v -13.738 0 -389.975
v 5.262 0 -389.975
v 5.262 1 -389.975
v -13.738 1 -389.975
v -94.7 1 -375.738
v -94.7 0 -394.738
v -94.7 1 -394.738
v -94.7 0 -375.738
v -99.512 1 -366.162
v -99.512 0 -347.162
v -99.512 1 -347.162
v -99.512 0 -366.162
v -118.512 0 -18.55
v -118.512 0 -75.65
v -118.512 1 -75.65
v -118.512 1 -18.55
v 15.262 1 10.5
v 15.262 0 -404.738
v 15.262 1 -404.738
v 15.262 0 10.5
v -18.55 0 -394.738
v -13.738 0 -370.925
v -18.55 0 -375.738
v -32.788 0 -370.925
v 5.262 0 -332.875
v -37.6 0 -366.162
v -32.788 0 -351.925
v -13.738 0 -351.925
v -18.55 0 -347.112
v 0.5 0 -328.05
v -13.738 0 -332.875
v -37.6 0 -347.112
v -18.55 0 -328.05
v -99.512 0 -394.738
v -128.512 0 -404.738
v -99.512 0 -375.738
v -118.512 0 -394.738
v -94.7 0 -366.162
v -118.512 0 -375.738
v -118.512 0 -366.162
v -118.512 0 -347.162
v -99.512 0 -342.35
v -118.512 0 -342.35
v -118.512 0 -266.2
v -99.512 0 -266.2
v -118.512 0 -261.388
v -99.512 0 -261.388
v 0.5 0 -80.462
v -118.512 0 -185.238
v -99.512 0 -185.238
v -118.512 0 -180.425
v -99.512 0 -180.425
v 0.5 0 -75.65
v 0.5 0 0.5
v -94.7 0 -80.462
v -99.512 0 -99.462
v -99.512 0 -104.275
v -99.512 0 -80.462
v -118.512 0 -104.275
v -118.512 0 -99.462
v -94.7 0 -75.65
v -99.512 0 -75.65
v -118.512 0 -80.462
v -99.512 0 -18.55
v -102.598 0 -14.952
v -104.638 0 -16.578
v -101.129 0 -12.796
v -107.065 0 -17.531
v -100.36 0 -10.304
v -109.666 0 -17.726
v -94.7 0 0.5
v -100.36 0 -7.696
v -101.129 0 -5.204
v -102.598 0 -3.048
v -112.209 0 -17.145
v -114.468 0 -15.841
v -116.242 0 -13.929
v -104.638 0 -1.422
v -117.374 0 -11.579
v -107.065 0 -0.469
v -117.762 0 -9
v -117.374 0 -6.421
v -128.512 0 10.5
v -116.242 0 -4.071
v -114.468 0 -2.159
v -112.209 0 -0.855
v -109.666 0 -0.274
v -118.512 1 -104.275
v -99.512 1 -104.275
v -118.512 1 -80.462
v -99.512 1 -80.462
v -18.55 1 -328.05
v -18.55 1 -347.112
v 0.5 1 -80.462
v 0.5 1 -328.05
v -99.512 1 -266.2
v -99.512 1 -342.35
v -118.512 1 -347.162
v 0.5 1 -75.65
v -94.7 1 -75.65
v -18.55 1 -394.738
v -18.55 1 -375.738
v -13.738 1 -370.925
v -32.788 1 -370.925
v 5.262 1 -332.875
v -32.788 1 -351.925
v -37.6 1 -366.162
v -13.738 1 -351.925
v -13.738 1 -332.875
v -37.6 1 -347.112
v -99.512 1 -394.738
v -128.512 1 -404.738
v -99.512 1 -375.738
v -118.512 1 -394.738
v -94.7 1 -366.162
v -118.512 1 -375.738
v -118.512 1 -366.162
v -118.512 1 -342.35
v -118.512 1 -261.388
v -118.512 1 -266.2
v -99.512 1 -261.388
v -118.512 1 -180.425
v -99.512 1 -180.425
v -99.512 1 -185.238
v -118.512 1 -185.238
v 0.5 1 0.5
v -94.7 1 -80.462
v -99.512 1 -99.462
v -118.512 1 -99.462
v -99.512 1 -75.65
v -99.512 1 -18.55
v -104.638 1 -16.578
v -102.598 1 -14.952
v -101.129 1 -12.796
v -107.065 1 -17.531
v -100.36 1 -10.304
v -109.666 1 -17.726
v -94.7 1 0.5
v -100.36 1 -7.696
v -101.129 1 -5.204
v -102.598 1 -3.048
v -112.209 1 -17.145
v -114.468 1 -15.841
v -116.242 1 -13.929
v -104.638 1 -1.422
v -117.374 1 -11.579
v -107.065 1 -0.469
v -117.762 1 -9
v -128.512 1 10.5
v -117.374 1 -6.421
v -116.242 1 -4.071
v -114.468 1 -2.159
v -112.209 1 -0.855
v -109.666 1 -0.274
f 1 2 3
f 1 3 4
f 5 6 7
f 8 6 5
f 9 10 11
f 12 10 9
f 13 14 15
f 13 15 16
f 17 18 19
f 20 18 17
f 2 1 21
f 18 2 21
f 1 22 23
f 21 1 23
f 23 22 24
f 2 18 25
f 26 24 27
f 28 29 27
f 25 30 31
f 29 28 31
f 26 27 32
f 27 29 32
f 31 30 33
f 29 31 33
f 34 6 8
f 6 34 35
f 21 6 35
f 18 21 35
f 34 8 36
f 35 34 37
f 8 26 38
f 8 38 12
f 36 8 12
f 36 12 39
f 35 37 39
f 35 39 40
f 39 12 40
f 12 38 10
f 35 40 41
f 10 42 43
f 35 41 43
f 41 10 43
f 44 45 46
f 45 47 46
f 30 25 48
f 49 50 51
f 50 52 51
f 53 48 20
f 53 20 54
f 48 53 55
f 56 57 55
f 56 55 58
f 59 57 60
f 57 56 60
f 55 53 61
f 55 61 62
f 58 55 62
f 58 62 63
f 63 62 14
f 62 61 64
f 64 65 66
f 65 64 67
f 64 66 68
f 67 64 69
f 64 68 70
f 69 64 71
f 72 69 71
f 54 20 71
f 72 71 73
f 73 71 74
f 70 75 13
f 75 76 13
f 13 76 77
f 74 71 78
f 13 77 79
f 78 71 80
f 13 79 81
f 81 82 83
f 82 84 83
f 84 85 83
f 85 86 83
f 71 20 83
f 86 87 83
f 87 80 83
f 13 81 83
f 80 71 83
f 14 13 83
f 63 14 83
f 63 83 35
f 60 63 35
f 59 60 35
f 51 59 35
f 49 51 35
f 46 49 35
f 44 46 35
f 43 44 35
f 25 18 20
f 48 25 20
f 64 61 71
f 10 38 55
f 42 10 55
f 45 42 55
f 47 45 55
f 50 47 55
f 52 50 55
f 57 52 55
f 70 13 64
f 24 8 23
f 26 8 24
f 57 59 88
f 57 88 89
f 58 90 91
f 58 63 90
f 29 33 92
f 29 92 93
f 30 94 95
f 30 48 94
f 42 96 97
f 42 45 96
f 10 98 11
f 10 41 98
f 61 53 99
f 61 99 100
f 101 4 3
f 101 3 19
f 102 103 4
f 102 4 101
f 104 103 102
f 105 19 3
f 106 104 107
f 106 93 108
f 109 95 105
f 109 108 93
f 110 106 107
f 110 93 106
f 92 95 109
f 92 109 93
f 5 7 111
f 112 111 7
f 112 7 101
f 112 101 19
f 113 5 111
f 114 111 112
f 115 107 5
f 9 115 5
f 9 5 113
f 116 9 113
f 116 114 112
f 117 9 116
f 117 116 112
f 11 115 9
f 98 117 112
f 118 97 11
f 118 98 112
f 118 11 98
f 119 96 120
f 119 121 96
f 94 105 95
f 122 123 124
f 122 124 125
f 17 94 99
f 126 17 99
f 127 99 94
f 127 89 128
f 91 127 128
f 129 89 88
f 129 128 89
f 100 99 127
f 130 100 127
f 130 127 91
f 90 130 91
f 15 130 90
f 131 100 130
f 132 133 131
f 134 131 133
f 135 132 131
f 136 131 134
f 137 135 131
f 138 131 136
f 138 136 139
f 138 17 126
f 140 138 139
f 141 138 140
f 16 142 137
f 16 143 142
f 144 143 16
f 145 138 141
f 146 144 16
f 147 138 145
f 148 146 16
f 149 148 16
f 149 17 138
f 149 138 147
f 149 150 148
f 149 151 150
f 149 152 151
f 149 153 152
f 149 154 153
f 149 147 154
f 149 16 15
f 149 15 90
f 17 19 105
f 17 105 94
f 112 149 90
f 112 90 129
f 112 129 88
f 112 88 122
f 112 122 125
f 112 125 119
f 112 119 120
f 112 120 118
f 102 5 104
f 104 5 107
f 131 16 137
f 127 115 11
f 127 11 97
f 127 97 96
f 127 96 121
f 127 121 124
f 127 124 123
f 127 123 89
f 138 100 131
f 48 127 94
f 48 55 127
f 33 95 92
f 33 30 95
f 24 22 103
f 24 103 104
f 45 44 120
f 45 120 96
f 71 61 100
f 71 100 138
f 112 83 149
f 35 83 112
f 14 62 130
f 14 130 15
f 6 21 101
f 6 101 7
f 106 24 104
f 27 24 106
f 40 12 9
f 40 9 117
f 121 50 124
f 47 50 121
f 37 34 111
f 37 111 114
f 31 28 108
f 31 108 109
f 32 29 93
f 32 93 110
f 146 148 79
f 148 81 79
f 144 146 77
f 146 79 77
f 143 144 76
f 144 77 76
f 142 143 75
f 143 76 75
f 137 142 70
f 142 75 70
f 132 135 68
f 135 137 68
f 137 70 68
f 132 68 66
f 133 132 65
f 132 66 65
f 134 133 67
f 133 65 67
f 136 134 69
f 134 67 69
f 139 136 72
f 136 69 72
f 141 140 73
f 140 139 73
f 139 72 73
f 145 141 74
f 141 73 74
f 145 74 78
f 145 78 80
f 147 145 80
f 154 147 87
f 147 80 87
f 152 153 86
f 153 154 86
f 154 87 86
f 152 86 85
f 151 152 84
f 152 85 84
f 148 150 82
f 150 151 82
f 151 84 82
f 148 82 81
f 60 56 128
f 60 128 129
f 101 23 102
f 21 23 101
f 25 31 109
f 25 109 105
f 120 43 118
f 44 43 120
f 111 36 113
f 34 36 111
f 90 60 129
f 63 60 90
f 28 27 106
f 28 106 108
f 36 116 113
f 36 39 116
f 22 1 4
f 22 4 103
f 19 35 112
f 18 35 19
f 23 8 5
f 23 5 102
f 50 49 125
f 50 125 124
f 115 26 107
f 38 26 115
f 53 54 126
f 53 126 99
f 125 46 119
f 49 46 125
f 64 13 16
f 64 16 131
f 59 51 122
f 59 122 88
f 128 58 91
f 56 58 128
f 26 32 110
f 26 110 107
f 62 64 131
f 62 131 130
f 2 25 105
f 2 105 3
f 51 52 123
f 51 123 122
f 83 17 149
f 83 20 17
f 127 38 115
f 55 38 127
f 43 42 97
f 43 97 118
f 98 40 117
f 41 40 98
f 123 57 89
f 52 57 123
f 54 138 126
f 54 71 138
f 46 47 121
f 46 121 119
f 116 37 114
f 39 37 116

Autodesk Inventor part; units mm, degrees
ref_plane "YZ Plane" through (0, 0, 0) normal (1, 0, 0) x (0, 1, 0)
ref_plane "XZ Plane" through (0, 0, 0) normal (0, 1, 0) x (-1, 0, 0)
ref_plane "XY Plane" through (0, 0, 0) normal (0, 0, 1) x (1, 0, 0)
sketch "Sketch1" plane through (0, 0, 0) normal (0, 1, 0) x (-1, 0, 0)
  line L0 (0, 0) -> (18, 0)
  line L1 (18, 0) -> (18, -37.05)
  line L2 (18, -37.05) -> (0, -37.05)
  line L3 (0, -37.05) -> (0, 0)
  line L4 (18, -38.1) -> (0, -38.1)
  line L5 (0, -38.1) -> (0, -56.1)
  line L6 (0, -56.1) -> (18, -56.1)
  line L7 (18, -56.1) -> (18, -38.1)
  line L8 (0, -57.15) -> (37.05, -57.15)
  line L9 (37.05, -57.15) -> (37.05, -75.15)
  line L10 (37.05, -75.15) -> (0, -75.15)
  line L11 (0, -75.15) -> (0, -57.15)
  line L12 (19.05, -56.1) -> (37.05, -56.1)
  line L13 (37.05, -56.1) -> (37.05, -38.1)
  line L14 (37.05, -38.1) -> (19.05, -38.1)
  line L15 (19.05, -38.1) -> (19.05, -56.1)
  line L16 (19.05, -37.05) -> (37.05, -37.05)
  line L17 (37.05, -37.05) -> (37.05, -19.05)
  line L18 (37.05, -19.05) -> (19.05, -19.05)
  line L19 (19.05, -19.05) -> (19.05, -37.05)
  line L20 (19.05, -18) -> (37.05, -18)
  line L21 (37.05, -18) -> (37.05, 0)
  line L22 (37.05, 0) -> (19.05, 0)
  line L23 (19.05, 0) -> (19.05, -18)
  line L24 (38.1, 0) -> (56.1, 0)
  line L25 (56.1, 0) -> (56.1, -18)
  line L26 (56.1, -18) -> (38.1, -18)
  line L27 (38.1, -18) -> (38.1, 0)
  line L28 (38.1, -19.05) -> (56.1, -19.05)
  line L29 (56.1, -19.05) -> (56.1, -37.05)
  line L30 (56.1, -37.05) -> (38.1, -37.05)
  line L31 (38.1, -37.05) -> (38.1, -19.05)
  line L32 (38.1, -38.1) -> (56.1, -38.1)
  line L33 (56.1, -38.1) -> (56.1, -56.1)
  line L34 (56.1, -56.1) -> (38.1, -56.1)
  line L35 (38.1, -56.1) -> (38.1, -38.1)
  line L36 (38.1, -57.15) -> (75.15, -57.15)
  line L37 (75.15, -57.15) -> (75.15, -75.15)
  line L38 (75.15, -75.15) -> (38.1, -75.15)
  line L39 (38.1, -75.15) -> (38.1, -57.15)
  line L40 (57.15, -56.1) -> (75.15, -56.1)
  line L41 (75.15, -56.1) -> (75.15, -38.1)
  line L42 (75.15, -38.1) -> (57.15, -38.1)
  line L43 (57.15, -38.1) -> (57.15, -56.1)
  line L44 (57.15, -37.05) -> (75.15, -37.05)
  line L45 (75.15, -37.05) -> (75.15, -19.05)
  line L46 (75.15, -19.05) -> (57.15, -19.05)
  line L47 (57.15, -19.05) -> (57.15, -37.05)
  line L48 (57.15, -18) -> (75.15, -18)
  line L49 (75.15, -18) -> (75.15, 0)
  line L50 (75.15, 0) -> (57.15, 0)
  line L51 (57.15, 0) -> (57.15, -18)
  line L52 (76.2, 0) -> (94.2, 0)
  line L53 (94.2, 0) -> (94.2, -18)
  line L54 (94.2, -18) -> (76.2, -18)
  line L55 (76.2, -18) -> (76.2, 0)
  line L56 (76.2, -19.05) -> (94.2, -19.05)
  line L57 (94.2, -19.05) -> (94.2, -37.05)
  line L58 (94.2, -37.05) -> (76.2, -37.05)
  line L59 (76.2, -37.05) -> (76.2, -19.05)
  line L60 (76.2, -38.1) -> (94.2, -38.1)
  line L61 (94.2, -38.1) -> (94.2, -56.1)
  line L62 (94.2, -56.1) -> (76.2, -56.1)
  line L63 (76.2, -56.1) -> (76.2, -38.1)
  line L64 (76.2, -57.15) -> (94.2, -57.15)
  line L65 (94.2, -57.15) -> (94.2, -75.15)
  line L66 (94.2, -75.15) -> (76.2, -75.15)
  line L67 (76.2, -75.15) -> (76.2, -57.15)
  line L68 (100.0125, -19.05) -> (118.0125, -19.05)
  line L69 (118.0125, -19.05) -> (118.0125, -37.05)
  line L70 (118.0125, -37.05) -> (100.0125, -37.05)
  line L71 (100.0125, -37.05) -> (100.0125, -19.05)
  line L72 (100.0125, -38.1) -> (118.0125, -38.1)
  line L73 (118.0125, -38.1) -> (118.0125, -56.1)
  line L74 (118.0125, -56.1) -> (100.0125, -56.1)
  line L75 (100.0125, -56.1) -> (100.0125, -38.1)
  line L76 (100.0125, -57.15) -> (118.0125, -57.15)
  line L77 (118.0125, -57.15) -> (118.0125, -75.15)
  line L78 (118.0125, -75.15) -> (100.0125, -75.15)
  line L79 (100.0125, -75.15) -> (100.0125, -57.15)
  line L80 (0, -80.9625) -> (18, -80.9625)
  line L81 (18, -80.9625) -> (18, -103.725)
  line L82 (18, -103.725) -> (0, -103.725)
  line L83 (0, -103.725) -> (0, -80.9625)
  line L84 (0, -104.775) -> (18, -104.775)
  line L85 (18, -104.775) -> (18, -127.5375)
  line L86 (18, -127.5375) -> (0, -127.5375)
  line L87 (0, -127.5375) -> (0, -104.775)
  line L88 (0, -128.5875) -> (18, -128.5875)
  line L89 (18, -128.5875) -> (18, -151.35)
  line L90 (18, -151.35) -> (0, -151.35)
  line L91 (0, -151.35) -> (0, -128.5875)
  line L92 (0, -152.4) -> (18, -152.4)
  line L93 (18, -152.4) -> (18, -270.4)
  line L94 (18, -270.4) -> (0, -270.4)
  line L95 (0, -270.4) -> (0, -152.4)
  line L96 (0, -271.45) -> (18, -271.45)
  line L97 (18, -271.45) -> (18, -289.45)
  line L98 (18, -289.45) -> (0, -289.45)
  line L99 (0, -289.45) -> (0, -271.45)
  line L100 (0, -290.5) -> (18, -290.5)
  line L101 (18, -290.5) -> (18, -308.5)
  line L102 (18, -308.5) -> (0, -308.5)
  line L103 (0, -308.5) -> (0, -290.5)
  line L104 (0, -309.55) -> (18, -309.55)
  line L105 (18, -309.55) -> (18, -327.55)
  line L106 (18, -327.55) -> (0, -327.55)
  line L107 (0, -327.55) -> (0, -309.55)
  line L108 (19.05, -80.9625) -> (37.05, -80.9625)
  line L109 (37.05, -80.9625) -> (37.05, -122.775)
  line L110 (37.05, -122.775) -> (19.05, -122.775)
  line L111 (19.05, -122.775) -> (19.05, -80.9625)
  line L112 (38.1, -80.9625) -> (56.1, -80.9625)
  line L113 (56.1, -80.9625) -> (56.1, -113.25)
  line L114 (56.1, -113.25) -> (38.1, -113.25)
  line L115 (38.1, -113.25) -> (38.1, -80.9625)
  line L116 (57.15, -80.9625) -> (75.15, -80.9625)
  line L117 (75.15, -80.9625) -> (75.15, -108.4875)
  line L118 (75.15, -108.4875) -> (57.15, -108.4875)
  line L119 (57.15, -108.4875) -> (57.15, -80.9625)
  line L120 (76.2, -80.9625) -> (94.2, -80.9625)
  line L121 (94.2, -80.9625) -> (94.2, -98.9625)
  line L122 (94.2, -98.9625) -> (76.2, -98.9625)
  line L123 (76.2, -98.9625) -> (76.2, -80.9625)
  line L124 (19.05, -123.825) -> (37.05, -123.825)
  line L125 (37.05, -123.825) -> (37.05, -141.825)
  line L126 (37.05, -141.825) -> (19.05, -141.825)
  line L127 (19.05, -141.825) -> (19.05, -123.825)
  line L128 (19.05, -142.875) -> (37.05, -142.875)
  line L129 (37.05, -142.875) -> (37.05, -160.875)
  line L130 (37.05, -160.875) -> (19.05, -160.875)
  line L131 (19.05, -160.875) -> (19.05, -142.875)
  line L132 (19.05, -161.925) -> (37.05, -161.925)
  line L133 (37.05, -161.925) -> (37.05, -179.925)
  line L134 (37.05, -179.925) -> (19.05, -179.925)
  line L135 (19.05, -179.925) -> (19.05, -161.925)
  line L136 (19.05, -180.975) -> (37.05, -180.975)
  line L137 (37.05, -180.975) -> (37.05, -198.975)
  line L138 (37.05, -198.975) -> (19.05, -198.975)
  line L139 (19.05, -198.975) -> (19.05, -180.975)
  line L140 (19.05, -200.025) -> (37.05, -200.025)
  line L141 (37.05, -200.025) -> (37.05, -218.025)
  line L142 (37.05, -218.025) -> (19.05, -218.025)
  line L143 (19.05, -218.025) -> (19.05, -200.025)
  line L144 (19.05, -219.075) -> (37.05, -219.075)
  line L145 (37.05, -219.075) -> (37.05, -237.075)
  line L146 (37.05, -237.075) -> (19.05, -237.075)
  line L147 (19.05, -237.075) -> (19.05, -219.075)
  line L148 (19.05, -238.125) -> (37.05, -238.125)
  line L149 (37.05, -238.125) -> (37.05, -256.125)
  line L150 (37.05, -256.125) -> (19.05, -256.125)
  line L151 (19.05, -256.125) -> (19.05, -238.125)
  line L152 (19.05, -257.175) -> (37.05, -257.175)
  line L153 (37.05, -257.175) -> (37.05, -275.175)
  line L154 (37.05, -275.175) -> (19.05, -275.175)
  line L155 (19.05, -275.175) -> (19.05, -257.175)
  line L156 (19.05, -276.225) -> (37.05, -276.225)
  line L157 (37.05, -276.225) -> (37.05, -294.225)
  line L158 (37.05, -294.225) -> (19.05, -294.225)
  line L159 (19.05, -294.225) -> (19.05, -276.225)
  line L160 (19.05, -313.275) -> (37.05, -313.275)
  line L161 (37.05, -313.275) -> (37.05, -295.275)
  line L162 (37.05, -295.275) -> (19.05, -295.275)
  line L163 (19.05, -295.275) -> (19.05, -313.275)
  line L164 (19.05, -314.325) -> (37.05, -314.325)
  line L165 (37.05, -314.325) -> (37.05, -346.6125)
  line L166 (37.05, -346.6125) -> (19.05, -346.6125)
  line L167 (19.05, -346.6125) -> (19.05, -314.325)
  line L168 (38.1, -114.3) -> (56.1, -114.3)
  line L169 (56.1, -114.3) -> (56.1, -132.3)
  line L170 (56.1, -132.3) -> (38.1, -132.3)
  line L171 (38.1, -132.3) -> (38.1, -114.3)
  line L172 (38.1, -133.35) -> (56.1, -133.35)
  line L173 (56.1, -133.35) -> (56.1, -151.35)
  line L174 (56.1, -151.35) -> (38.1, -151.35)
  line L175 (38.1, -151.35) -> (38.1, -133.35)
  line L176 (38.1, -152.4) -> (56.1, -152.4)
  line L177 (56.1, -152.4) -> (56.1, -170.4)
  line L178 (56.1, -170.4) -> (38.1, -170.4)
  line L179 (38.1, -170.4) -> (38.1, -152.4)
  line L180 (38.1, -171.45) -> (56.1, -171.45)
  line L181 (56.1, -171.45) -> (56.1, -189.45)
  line L182 (56.1, -189.45) -> (38.1, -189.45)
  line L183 (38.1, -189.45) -> (38.1, -171.45)
  line L184 (38.1, -190.5) -> (56.1, -190.5)
  line L185 (56.1, -190.5) -> (56.1, -208.5)
  line L186 (56.1, -208.5) -> (38.1, -208.5)
  line L187 (38.1, -208.5) -> (38.1, -190.5)
  line L188 (56.1, -209.55) -> (38.1, -209.55)
  line L189 (38.1, -209.55) -> (38.1, -227.55)
  line L190 (38.1, -227.55) -> (56.1, -227.55)
  line L191 (56.1, -227.55) -> (56.1, -209.55)
  line L192 (38.1, -228.6) -> (56.1, -228.6)
  line L193 (56.1, -228.6) -> (56.1, -246.6)
  line L194 (56.1, -246.6) -> (38.1, -246.6)
  line L195 (38.1, -246.6) -> (38.1, -228.6)
  line L196 (38.1, -247.65) -> (56.1, -247.65)
  line L197 (56.1, -247.65) -> (56.1, -265.65)
  line L198 (56.1, -265.65) -> (38.1, -265.65)
  line L199 (38.1, -265.65) -> (38.1, -247.65)
  line L200 (38.1, -266.7) -> (56.1, -266.7)
  line L201 (56.1, -266.7) -> (56.1, -284.7)
  line L202 (56.1, -284.7) -> (38.1, -284.7)
  line L203 (38.1, -284.7) -> (38.1, -266.7)
  line L204 (38.1, -285.75) -> (56.1, -285.75)
  line L205 (56.1, -285.75) -> (56.1, -303.75)
  line L206 (56.1, -303.75) -> (38.1, -303.75)
  line L207 (38.1, -303.75) -> (38.1, -285.75)
  line L208 (38.1, -304.8) -> (56.1, -304.8)
  line L209 (56.1, -304.8) -> (56.1, -322.8)
  line L210 (56.1, -322.8) -> (38.1, -322.8)
  line L211 (38.1, -322.8) -> (38.1, -304.8)
  line L212 (38.1, -323.85) -> (56.1, -323.85)
  line L213 (56.1, -323.85) -> (56.1, -365.6625)
  line L214 (56.1, -365.6625) -> (38.1, -365.6625)
  line L215 (38.1, -365.6625) -> (38.1, -323.85)
  line L216 (75.15, -109.5375) -> (57.15, -109.5375)
  line L217 (57.15, -109.5375) -> (57.15, -127.5375)
  line L218 (57.15, -127.5375) -> (75.15, -127.5375)
  line L219 (75.15, -127.5375) -> (75.15, -109.5375)
  line L220 (75.15, -128.5875) -> (57.15, -128.5875)
  line L221 (57.15, -128.5875) -> (57.15, -146.5875)
  line L222 (57.15, -146.5875) -> (75.15, -146.5875)
  line L223 (75.15, -146.5875) -> (75.15, -128.5875)
  line L224 (75.15, -147.6375) -> (57.15, -147.6375)
  line L225 (57.15, -147.6375) -> (57.15, -165.6375)
  line L226 (57.15, -165.6375) -> (75.15, -165.6375)
  line L227 (75.15, -165.6375) -> (75.15, -147.6375)
  line L228 (75.15, -166.6875) -> (57.15, -166.6875)
  line L229 (57.15, -166.6875) -> (57.15, -184.6875)
  line L230 (57.15, -184.6875) -> (75.15, -184.6875)
  line L231 (75.15, -184.6875) -> (75.15, -166.6875)
  line L232 (75.15, -185.7375) -> (57.15, -185.7375)
  line L233 (57.15, -185.7375) -> (57.15, -203.7375)
  line L234 (57.15, -203.7375) -> (75.15, -203.7375)
  line L235 (75.15, -203.7375) -> (75.15, -185.7375)
  line L236 (75.15, -204.7875) -> (57.15, -204.7875)
  line L237 (57.15, -204.7875) -> (57.15, -222.7875)
  line L238 (57.15, -222.7875) -> (75.15, -222.7875)
  line L239 (75.15, -222.7875) -> (75.15, -204.7875)
  line L240 (75.15, -223.8375) -> (57.15, -223.8375)
  line L241 (57.15, -223.8375) -> (57.15, -241.8375)
  line L242 (57.15, -241.8375) -> (75.15, -241.8375)
  line L243 (75.15, -241.8375) -> (75.15, -223.8375)
  line L244 (75.15, -242.8875) -> (57.15, -242.8875)
  line L245 (57.15, -242.8875) -> (57.15, -260.8875)
  line L246 (57.15, -260.8875) -> (75.15, -260.8875)
  line L247 (75.15, -260.8875) -> (75.15, -242.8875)
  line L248 (75.15, -261.9375) -> (57.15, -261.9375)
  line L249 (57.15, -261.9375) -> (57.15, -279.9375)
  line L250 (57.15, -279.9375) -> (75.15, -279.9375)
  line L251 (75.15, -279.9375) -> (75.15, -261.9375)
  line L252 (75.15, -280.9875) -> (57.15, -280.9875)
  line L253 (57.15, -280.9875) -> (57.15, -298.9875)
  line L254 (57.15, -298.9875) -> (75.15, -298.9875)
  line L255 (75.15, -298.9875) -> (75.15, -280.9875)
  line L256 (57.15, -300.0375) -> (75.15, -300.0375)
  line L257 (75.15, -300.0375) -> (75.15, -318.0375)
  line L258 (75.15, -318.0375) -> (57.15, -318.0375)
  line L259 (57.15, -318.0375) -> (57.15, -300.0375)
  line L260 (57.15, -319.0875) -> (75.15, -319.0875)
  line L261 (75.15, -319.0875) -> (75.15, -337.0875)
  line L262 (75.15, -337.0875) -> (57.15, -337.0875)
  line L263 (57.15, -337.0875) -> (57.15, -319.0875)
  line L264 (75.15, -338.1375) -> (57.15, -338.1375)
  line L265 (57.15, -338.1375) -> (57.15, -365.6625)
  line L266 (57.15, -365.6625) -> (75.15, -365.6625)
  line L267 (75.15, -365.6625) -> (75.15, -338.1375)
  line L268 (76.2, -100.0125) -> (94.2, -100.0125)
  line L269 (94.2, -100.0125) -> (94.2, -118.0125)
  line L270 (94.2, -118.0125) -> (76.2, -118.0125)
  line L271 (76.2, -118.0125) -> (76.2, -100.0125)
  line L272 (76.2, -119.0625) -> (94.2, -119.0625)
  line L273 (94.2, -119.0625) -> (94.2, -137.0625)
  line L274 (94.2, -137.0625) -> (76.2, -137.0625)
  line L275 (76.2, -137.0625) -> (76.2, -119.0625)
  line L276 (76.2, -138.1125) -> (94.2, -138.1125)
  line L277 (94.2, -138.1125) -> (94.2, -156.1125)
  line L278 (94.2, -156.1125) -> (76.2, -156.1125)
  line L279 (76.2, -156.1125) -> (76.2, -138.1125)
  line L280 (76.2, -157.1625) -> (94.2, -157.1625)
  line L281 (94.2, -157.1625) -> (94.2, -175.1625)
  line L282 (94.2, -175.1625) -> (76.2, -175.1625)
  line L283 (76.2, -175.1625) -> (76.2, -157.1625)
  line L284 (76.2, -176.2125) -> (94.2, -176.2125)
  line L285 (94.2, -176.2125) -> (94.2, -194.2125)
  line L286 (94.2, -194.2125) -> (76.2, -194.2125)
  line L287 (76.2, -194.2125) -> (76.2, -176.2125)
  line L288 (76.2, -195.2625) -> (94.2, -195.2625)
  line L289 (94.2, -195.2625) -> (94.2, -213.2625)
  line L290 (94.2, -213.2625) -> (76.2, -213.2625)
  line L291 (76.2, -213.2625) -> (76.2, -195.2625)
  line L292 (76.2, -214.3125) -> (94.2, -214.3125)
  line L293 (94.2, -214.3125) -> (94.2, -232.3125)
  line L294 (94.2, -232.3125) -> (76.2, -232.3125)
  line L295 (76.2, -232.3125) -> (76.2, -214.3125)
  line L296 (76.2, -233.3625) -> (94.2, -233.3625)
  line L297 (94.2, -233.3625) -> (94.2, -251.3625)
  line L298 (94.2, -251.3625) -> (76.2, -251.3625)
  line L299 (76.2, -251.3625) -> (76.2, -233.3625)
  line L300 (76.2, -252.4125) -> (94.2, -252.4125)
  line L301 (94.2, -252.4125) -> (94.2, -270.4125)
  line L302 (94.2, -270.4125) -> (76.2, -270.4125)
  line L303 (76.2, -270.4125) -> (76.2, -252.4125)
  line L304 (76.2, -271.4625) -> (94.2, -271.4625)
  line L305 (94.2, -271.4625) -> (94.2, -289.4625)
  line L306 (94.2, -289.4625) -> (76.2, -289.4625)
  line L307 (76.2, -289.4625) -> (76.2, -271.4625)
  line L308 (76.2, -290.5125) -> (94.2, -290.5125)
  line L309 (94.2, -290.5125) -> (94.2, -308.5125)
  line L310 (94.2, -308.5125) -> (76.2, -308.5125)
  line L311 (76.2, -308.5125) -> (76.2, -290.5125)
  line L312 (76.2, -309.5625) -> (94.2, -309.5625)
  line L313 (94.2, -309.5625) -> (94.2, -327.5625)
  line L314 (94.2, -327.5625) -> (76.2, -327.5625)
  line L315 (76.2, -327.5625) -> (76.2, -309.5625)
  line L316 (76.2, -328.6125) -> (94.2, -328.6125)
  line L317 (94.2, -328.6125) -> (94.2, -365.6625)
  line L318 (94.2, -365.6625) -> (76.2, -365.6625)
  line L319 (76.2, -365.6625) -> (76.2, -328.6125)
  line L320 (100.0125, -80.9625) -> (118.0125, -80.9625)
  line L321 (118.0125, -80.9625) -> (118.0125, -98.9625)
  line L322 (118.0125, -98.9625) -> (100.0125, -98.9625)
  line L323 (100.0125, -98.9625) -> (100.0125, -80.9625)
  line L324 (118.0125, -104.775) -> (100.0125, -104.775)
  line L325 (100.0125, -104.775) -> (100.0125, -122.775)
  line L326 (100.0125, -122.775) -> (118.0125, -122.775)
  line L327 (118.0125, -122.775) -> (118.0125, -104.775)
  line L328 (118.0125, -123.825) -> (100.0125, -123.825)
  line L329 (100.0125, -123.825) -> (100.0125, -141.825)
  line L330 (100.0125, -141.825) -> (118.0125, -141.825)
  line L331 (118.0125, -141.825) -> (118.0125, -123.825)
  line L332 (118.0125, -142.875) -> (100.0125, -142.875)
  line L333 (100.0125, -142.875) -> (100.0125, -160.875)
  line L334 (100.0125, -160.875) -> (118.0125, -160.875)
  line L335 (118.0125, -160.875) -> (118.0125, -142.875)
  line L336 (118.0125, -161.925) -> (100.0125, -161.925)
  line L337 (100.0125, -161.925) -> (100.0125, -179.925)
  line L338 (100.0125, -179.925) -> (118.0125, -179.925)
  line L339 (118.0125, -179.925) -> (118.0125, -161.925)
  line L340 (118.0125, -203.7375) -> (100.0125, -203.7375)
  line L341 (100.0125, -203.7375) -> (100.0125, -185.7375)
  line L342 (100.0125, -185.7375) -> (118.0125, -185.7375)
  line L343 (118.0125, -185.7375) -> (118.0125, -203.7375)
  line L344 (118.0125, -204.7875) -> (100.0125, -204.7875)
  line L345 (100.0125, -204.7875) -> (100.0125, -222.7875)
  line L346 (100.0125, -222.7875) -> (118.0125, -222.7875)
  line L347 (118.0125, -222.7875) -> (118.0125, -204.7875)
  line L348 (118.0125, -223.8375) -> (100.0125, -223.8375)
  line L349 (100.0125, -223.8375) -> (100.0125, -241.8375)
  line L350 (100.0125, -241.8375) -> (118.0125, -241.8375)
  line L351 (118.0125, -241.8375) -> (118.0125, -223.8375)
  line L352 (118.0125, -242.8875) -> (100.0125, -242.8875)
  line L353 (100.0125, -242.8875) -> (100.0125, -260.8875)
  line L354 (100.0125, -260.8875) -> (118.0125, -260.8875)
  line L355 (118.0125, -260.8875) -> (118.0125, -242.8875)
  line L356 (118.0125, -266.7) -> (100.0125, -266.7)
  line L357 (100.0125, -266.7) -> (100.0125, -284.7)
  line L358 (100.0125, -284.7) -> (118.0125, -284.7)
  line L359 (118.0125, -284.7) -> (118.0125, -266.7)
  line L360 (118.0125, -285.75) -> (100.0125, -285.75)
  line L361 (100.0125, -285.75) -> (100.0125, -303.75)
  line L362 (100.0125, -303.75) -> (118.0125, -303.75)
  line L363 (118.0125, -303.75) -> (118.0125, -285.75)
  line L364 (118.0125, -304.8) -> (100.0125, -304.8)
  line L365 (100.0125, -304.8) -> (100.0125, -322.8)
  line L366 (100.0125, -322.8) -> (118.0125, -322.8)
  line L367 (118.0125, -322.8) -> (118.0125, -304.8)
  line L368 (118.0125, -323.85) -> (100.0125, -323.85)
  line L369 (100.0125, -323.85) -> (100.0125, -341.85)
  line L370 (100.0125, -341.85) -> (118.0125, -341.85)
  line L371 (118.0125, -341.85) -> (118.0125, -323.85)
  line L372 (118.0125, -347.6625) -> (100.0125, -347.6625)
  line L373 (100.0125, -347.6625) -> (100.0125, -365.6625)
  line L374 (100.0125, -365.6625) -> (118.0125, -365.6625)
  line L375 (118.0125, -365.6625) -> (118.0125, -347.6625)
  line L376 (118.0125, -376.2375) -> (100.0125, -376.2375)
  line L377 (100.0125, -376.2375) -> (100.0125, -394.2375)
  line L378 (100.0125, -394.2375) -> (118.0125, -394.2375)
  line L379 (118.0125, -394.2375) -> (118.0125, -376.2375)
  line L380 (13.2375, -333.375) -> (-4.7625, -333.375)
  line L381 (-4.7625, -333.375) -> (-4.7625, -351.375)
  line L382 (-4.7625, -351.375) -> (13.2375, -351.375)
  line L383 (13.2375, -351.375) -> (13.2375, -333.375)
  line L384 (13.2375, -352.425) -> (-4.7625, -352.425)
  line L385 (-4.7625, -352.425) -> (-4.7625, -370.425)
  line L386 (-4.7625, -370.425) -> (13.2375, -370.425)
  line L387 (13.2375, -370.425) -> (13.2375, -352.425)
  line L388 (13.2375, -371.475) -> (-4.7625, -371.475)
  line L389 (-4.7625, -371.475) -> (-4.7625, -389.475)
  line L390 (-4.7625, -389.475) -> (13.2375, -389.475)
  line L391 (13.2375, -389.475) -> (13.2375, -371.475)
  line L392 (14.2875, -370.425) -> (32.2875, -370.425)
  line L393 (32.2875, -370.425) -> (32.2875, -352.425)
  line L394 (32.2875, -352.425) -> (14.2875, -352.425)
  line L395 (14.2875, -352.425) -> (14.2875, -370.425)
  line L396 (19.05, -376.2375) -> (37.05, -376.2375)
  line L397 (37.05, -376.2375) -> (37.05, -394.2375)
  line L398 (37.05, -394.2375) -> (19.05, -394.2375)
  line L399 (19.05, -394.2375) -> (19.05, -376.2375)
  line L400 (57.15, -376.2375) -> (75.15, -376.2375)
  line L401 (75.15, -376.2375) -> (75.15, -394.2375)
  line L402 (75.15, -394.2375) -> (57.15, -394.2375)
  line L403 (57.15, -394.2375) -> (57.15, -376.2375)
  line L404 (76.2, -376.2375) -> (94.2, -376.2375)
  line L405 (94.2, -376.2375) -> (94.2, -394.2375)
  line L406 (94.2, -394.2375) -> (76.2, -394.2375)
  line L407 (76.2, -394.2375) -> (76.2, -376.2375)
  line L408 (56.1, -376.2375) -> (38.1, -376.2375)
  line L409 (38.1, -376.2375) -> (38.1, -394.2375)
  line L410 (38.1, -394.2375) -> (56.1, -394.2375)
  line L411 (56.1, -394.2375) -> (56.1, -376.2375)
  circle A0 centre (109.0125, -9) radius 8.5
  circle A1 centre (109.0125, -9) radius 8.75
  line L412 (118.5125, -18.55) -> (99.5125, -18.55)
  line L413 (99.5125, -18.55) -> (99.5125, -75.65)
  line L414 (99.5125, -75.65) -> (118.5125, -75.65)
  line L415 (118.5125, -75.65) -> (118.5125, -18.55)
  line L416 (118.5125, -80.4625) -> (99.5125, -80.4625)
  line L417 (99.5125, -80.4625) -> (99.5125, -99.4625)
  line L418 (99.5125, -99.4625) -> (118.5125, -99.4625)
  line L419 (118.5125, -99.4625) -> (118.5125, -80.4625)
  line L420 (118.5125, -104.275) -> (99.5125, -104.275)
  line L421 (99.5125, -104.275) -> (99.5125, -180.425)
  line L422 (99.5125, -180.425) -> (118.5125, -180.425)
  line L423 (118.5125, -180.425) -> (118.5125, -104.275)
  line L424 (118.5125, -185.2375) -> (99.5125, -185.2375)
  line L425 (99.5125, -185.2375) -> (99.5125, -261.3875)
  line L426 (99.5125, -261.3875) -> (118.5125, -261.3875)
  line L427 (118.5125, -261.3875) -> (118.5125, -185.2375)
  line L428 (118.5125, -266.2) -> (99.5125, -266.2)
  line L429 (99.5125, -266.2) -> (99.5125, -342.35)
  line L430 (99.5125, -342.35) -> (118.5125, -342.35)
  line L431 (118.5125, -342.35) -> (118.5125, -266.2)
  line L432 (118.5125, -347.1625) -> (99.5125, -347.1625)
  line L433 (99.5125, -347.1625) -> (99.5125, -366.1625)
  line L434 (99.5125, -366.1625) -> (118.5125, -366.1625)
  line L435 (118.5125, -366.1625) -> (118.5125, -347.1625)
  line L436 (118.5125, -375.7375) -> (99.5125, -375.7375)
  line L437 (99.5125, -375.7375) -> (99.5125, -394.7375)
  line L438 (99.5125, -394.7375) -> (118.5125, -394.7375)
  line L439 (118.5125, -394.7375) -> (118.5125, -375.7375)
  line L440 (94.7, -375.7375) -> (18.55, -375.7375)
  line L441 (18.55, -375.7375) -> (18.55, -394.7375)
  line L442 (18.55, -394.7375) -> (94.7, -394.7375)
  line L443 (94.7, -394.7375) -> (94.7, -375.7375)
  line L444 (94.7, 0.5) -> (-0.5, 0.5)
  line L445 (-0.5, 0.5) -> (-0.5, -75.65)
  line L446 (-0.5, -75.65) -> (94.7, -75.65)
  line L447 (94.7, -75.65) -> (94.7, 0.5)
  line L448 (94.7, -80.4625) -> (-0.5, -80.4625)
  line L449 (-0.5, -80.4625) -> (-0.5, -328.05)
  line L450 (-0.5, -328.05) -> (18.55, -328.05)
  line L451 (18.55, -328.05) -> (18.55, -347.1125)
  line L452 (18.55, -347.1125) -> (37.6, -347.1125)
  line L453 (37.6, -347.1125) -> (37.6, -366.1625)
  line L454 (37.6, -366.1625) -> (94.7, -366.1625)
  line L455 (94.7, -366.1625) -> (94.7, -80.4625)
  line L456 (-5.2625, -332.875) -> (-5.2625, -389.975)
  line L457 (-5.2625, -389.975) -> (13.7375, -389.975)
  line L458 (13.7375, -389.975) -> (13.7375, -370.925)
  line L459 (13.7375, -370.925) -> (32.7875, -370.925)
  line L460 (32.7875, -370.925) -> (32.7875, -351.925)
  line L461 (32.7875, -351.925) -> (13.7375, -351.925)
  line L462 (13.7375, -351.925) -> (13.7375, -332.875)
  line L463 (13.7375, -332.875) -> (-5.2625, -332.875)
  line L464 (-15.2625, 10.5) -> (128.5125, 10.5)
  line L465 (128.5125, 10.5) -> (128.5125, -404.7375)
  line L466 (128.5125, -404.7375) -> (-15.2625, -404.7375)
  line L467 (-15.2625, -404.7375) -> (-15.2625, 10.5)
  point P0 (0, 0)
  dimension "d0" = 37.05
  dimension "d1" = 18
  dimension "d2" = 0
  dimension "d3" = 0
  dimension "d4" = 18
  dimension "d5" = 1.05
  dimension "d6" = 37.05
  dimension "d7" = 18
  dimension "d8" = 1.05
  dimension "d10" = 18
  dimension "d12" = 18
  dimension "d13" = 18
  dimension "d15" = 18
  dimension "d16" = 18
  dimension "d17" = 1.05
  dimension "d18" = 1.05
  dimension "d21" = 18
  dimension "d25" = 1.05
  dimension "d26" = 37.05
  dimension "d27" = 18
  dimension "d33" = 1.05
  dimension "d34" = 18
  dimension "d37" = 22.7625
  dimension "d38" = 5.8125
  dimension "d39" = 22.7625
  dimension "d40" = 22.7625
  dimension "d41" = 1.05
  dimension "d42" = 1.05
  dimension "d43" = 1.05
  dimension "d44" = 1.05
  dimension "d45" = 1.05
  dimension "d46" = 1.05
  dimension "d47" = 18
  dimension "d48" = 18
  dimension "d49" = 18
  dimension "d50" = 118
  dimension "d51" = 41.8125
  dimension "d52" = 1.05
  dimension "d53" = 32.2875
  dimension "d54" = 27.525
  dimension "d55" = 18
  dimension "d56" = 1.05
  dimension "d57" = 1.05
  dimension "d58" = 1.05
  dimension "d59" = 1.05
  dimension "d60" = 1.05
  dimension "d61" = 1.05
  dimension "d62" = 1.05
  dimension "d63" = 1.05
  dimension "d64" = 1.05
  dimension "d66" = 18
  dimension "d67" = 18
  dimension "d68" = 18
  dimension "d69" = 18
  dimension "d70" = 18
  dimension "d71" = 18
  dimension "d72" = 18
  dimension "d73" = 18
  dimension "d74" = 18
  dimension "d75" = 18
  dimension "d76" = 1.05
  dimension "d77" = 1.05
  dimension "d78" = 32.2875
  dimension "d79" = 18
extrude "Extrusion1" add sketch "Sketch1" along normal blind 1 contours L464 L465 L466 L467
equation "\"d0\" = u2"
equation "\"d1\" = u1"
equation "\"d4\" = u1"
equation "\"d5\" = spacing"
equation "\"d6\" = u2"
equation "\"d7\" = u1"
equation "\"d8\" = spacing"
equation "\"d10\" = u1"
equation "\"d12\" = u1"
equation "\"d13\" = u1"
equation "\"d15\" = u1"
equation "\"d16\" = u1"
equation "\"d17\" = spacing"
equation "\"d18\" = spacing"
equation "\"d21\" = u1"
equation "\"d25\" = spacing"
equation "\"d26\" = u2"
equation "\"d27\" = u1"
equation "\"d33\" = spacing"
equation "\"d34\" = u1"
equation "\"d37\" = u125"
equation "\"d39\" = u125"
equation "\"d40\" = u125"
equation "\"d41\" = spacing"
equation "\"d42\" = spacing"
equation "\"d43\" = spacing"
equation "\"d44\" = spacing"
equation "\"d45\" = spacing"
equation "\"d46\" = spacing"
equation "\"d47\" = u1"
equation "\"d48\" = u1"
equation "\"d49\" = u1"
equation "\"d50\" = uspace"
equation "\"d51\" = u225"
equation "\"d52\" = spacing"
equation "\"d53\" = u175"
equation "\"d54\" = u15"
equation "\"d55\" = u1"
equation "\"d56\" = spacing"
equation "\"d57\" = spacing"
equation "\"d58\" = spacing"
equation "\"d59\" = spacing"
equation "\"d60\" = spacing"
equation "\"d61\" = spacing"
equation "\"d62\" = spacing"
equation "\"d63\" = spacing"
equation "\"d64\" = spacing"
equation "\"d66\" = u1"
equation "\"d67\" = u1"
equation "\"d68\" = u1"
equation "\"d69\" = u1"
equation "\"d70\" = u1"
equation "\"d71\" = u1"
equation "\"d72\" = u1"
equation "\"d73\" = u1"
equation "\"d74\" = u1"
equation "\"d75\" = u1"
equation "\"d76\" = spacing"
equation "\"d77\" = spacing"
equation "\"d78\" = u175"
equation "\"d79\" = u1"
equation "\"u2\" = 37.05"
equation "\"u1\" = 18"
equation "\"u125\" = 22.7625"
equation "\"u15\" = 27.525"
equation "\"u175\" = 32.2875"
equation "\"u225\" = 41.8125"
equation "\"u25\" = 46.575"
equation "\"u275\" = 51.3375"
equation "\"spacing\" = 1.05"
equation "\"uspace\" = 118"
equation "\"spacing2\" = 5.8125"
equation "\"size\" = 19.05"
equation "\"gap\" = 0.5"
properties part number "Layout"
